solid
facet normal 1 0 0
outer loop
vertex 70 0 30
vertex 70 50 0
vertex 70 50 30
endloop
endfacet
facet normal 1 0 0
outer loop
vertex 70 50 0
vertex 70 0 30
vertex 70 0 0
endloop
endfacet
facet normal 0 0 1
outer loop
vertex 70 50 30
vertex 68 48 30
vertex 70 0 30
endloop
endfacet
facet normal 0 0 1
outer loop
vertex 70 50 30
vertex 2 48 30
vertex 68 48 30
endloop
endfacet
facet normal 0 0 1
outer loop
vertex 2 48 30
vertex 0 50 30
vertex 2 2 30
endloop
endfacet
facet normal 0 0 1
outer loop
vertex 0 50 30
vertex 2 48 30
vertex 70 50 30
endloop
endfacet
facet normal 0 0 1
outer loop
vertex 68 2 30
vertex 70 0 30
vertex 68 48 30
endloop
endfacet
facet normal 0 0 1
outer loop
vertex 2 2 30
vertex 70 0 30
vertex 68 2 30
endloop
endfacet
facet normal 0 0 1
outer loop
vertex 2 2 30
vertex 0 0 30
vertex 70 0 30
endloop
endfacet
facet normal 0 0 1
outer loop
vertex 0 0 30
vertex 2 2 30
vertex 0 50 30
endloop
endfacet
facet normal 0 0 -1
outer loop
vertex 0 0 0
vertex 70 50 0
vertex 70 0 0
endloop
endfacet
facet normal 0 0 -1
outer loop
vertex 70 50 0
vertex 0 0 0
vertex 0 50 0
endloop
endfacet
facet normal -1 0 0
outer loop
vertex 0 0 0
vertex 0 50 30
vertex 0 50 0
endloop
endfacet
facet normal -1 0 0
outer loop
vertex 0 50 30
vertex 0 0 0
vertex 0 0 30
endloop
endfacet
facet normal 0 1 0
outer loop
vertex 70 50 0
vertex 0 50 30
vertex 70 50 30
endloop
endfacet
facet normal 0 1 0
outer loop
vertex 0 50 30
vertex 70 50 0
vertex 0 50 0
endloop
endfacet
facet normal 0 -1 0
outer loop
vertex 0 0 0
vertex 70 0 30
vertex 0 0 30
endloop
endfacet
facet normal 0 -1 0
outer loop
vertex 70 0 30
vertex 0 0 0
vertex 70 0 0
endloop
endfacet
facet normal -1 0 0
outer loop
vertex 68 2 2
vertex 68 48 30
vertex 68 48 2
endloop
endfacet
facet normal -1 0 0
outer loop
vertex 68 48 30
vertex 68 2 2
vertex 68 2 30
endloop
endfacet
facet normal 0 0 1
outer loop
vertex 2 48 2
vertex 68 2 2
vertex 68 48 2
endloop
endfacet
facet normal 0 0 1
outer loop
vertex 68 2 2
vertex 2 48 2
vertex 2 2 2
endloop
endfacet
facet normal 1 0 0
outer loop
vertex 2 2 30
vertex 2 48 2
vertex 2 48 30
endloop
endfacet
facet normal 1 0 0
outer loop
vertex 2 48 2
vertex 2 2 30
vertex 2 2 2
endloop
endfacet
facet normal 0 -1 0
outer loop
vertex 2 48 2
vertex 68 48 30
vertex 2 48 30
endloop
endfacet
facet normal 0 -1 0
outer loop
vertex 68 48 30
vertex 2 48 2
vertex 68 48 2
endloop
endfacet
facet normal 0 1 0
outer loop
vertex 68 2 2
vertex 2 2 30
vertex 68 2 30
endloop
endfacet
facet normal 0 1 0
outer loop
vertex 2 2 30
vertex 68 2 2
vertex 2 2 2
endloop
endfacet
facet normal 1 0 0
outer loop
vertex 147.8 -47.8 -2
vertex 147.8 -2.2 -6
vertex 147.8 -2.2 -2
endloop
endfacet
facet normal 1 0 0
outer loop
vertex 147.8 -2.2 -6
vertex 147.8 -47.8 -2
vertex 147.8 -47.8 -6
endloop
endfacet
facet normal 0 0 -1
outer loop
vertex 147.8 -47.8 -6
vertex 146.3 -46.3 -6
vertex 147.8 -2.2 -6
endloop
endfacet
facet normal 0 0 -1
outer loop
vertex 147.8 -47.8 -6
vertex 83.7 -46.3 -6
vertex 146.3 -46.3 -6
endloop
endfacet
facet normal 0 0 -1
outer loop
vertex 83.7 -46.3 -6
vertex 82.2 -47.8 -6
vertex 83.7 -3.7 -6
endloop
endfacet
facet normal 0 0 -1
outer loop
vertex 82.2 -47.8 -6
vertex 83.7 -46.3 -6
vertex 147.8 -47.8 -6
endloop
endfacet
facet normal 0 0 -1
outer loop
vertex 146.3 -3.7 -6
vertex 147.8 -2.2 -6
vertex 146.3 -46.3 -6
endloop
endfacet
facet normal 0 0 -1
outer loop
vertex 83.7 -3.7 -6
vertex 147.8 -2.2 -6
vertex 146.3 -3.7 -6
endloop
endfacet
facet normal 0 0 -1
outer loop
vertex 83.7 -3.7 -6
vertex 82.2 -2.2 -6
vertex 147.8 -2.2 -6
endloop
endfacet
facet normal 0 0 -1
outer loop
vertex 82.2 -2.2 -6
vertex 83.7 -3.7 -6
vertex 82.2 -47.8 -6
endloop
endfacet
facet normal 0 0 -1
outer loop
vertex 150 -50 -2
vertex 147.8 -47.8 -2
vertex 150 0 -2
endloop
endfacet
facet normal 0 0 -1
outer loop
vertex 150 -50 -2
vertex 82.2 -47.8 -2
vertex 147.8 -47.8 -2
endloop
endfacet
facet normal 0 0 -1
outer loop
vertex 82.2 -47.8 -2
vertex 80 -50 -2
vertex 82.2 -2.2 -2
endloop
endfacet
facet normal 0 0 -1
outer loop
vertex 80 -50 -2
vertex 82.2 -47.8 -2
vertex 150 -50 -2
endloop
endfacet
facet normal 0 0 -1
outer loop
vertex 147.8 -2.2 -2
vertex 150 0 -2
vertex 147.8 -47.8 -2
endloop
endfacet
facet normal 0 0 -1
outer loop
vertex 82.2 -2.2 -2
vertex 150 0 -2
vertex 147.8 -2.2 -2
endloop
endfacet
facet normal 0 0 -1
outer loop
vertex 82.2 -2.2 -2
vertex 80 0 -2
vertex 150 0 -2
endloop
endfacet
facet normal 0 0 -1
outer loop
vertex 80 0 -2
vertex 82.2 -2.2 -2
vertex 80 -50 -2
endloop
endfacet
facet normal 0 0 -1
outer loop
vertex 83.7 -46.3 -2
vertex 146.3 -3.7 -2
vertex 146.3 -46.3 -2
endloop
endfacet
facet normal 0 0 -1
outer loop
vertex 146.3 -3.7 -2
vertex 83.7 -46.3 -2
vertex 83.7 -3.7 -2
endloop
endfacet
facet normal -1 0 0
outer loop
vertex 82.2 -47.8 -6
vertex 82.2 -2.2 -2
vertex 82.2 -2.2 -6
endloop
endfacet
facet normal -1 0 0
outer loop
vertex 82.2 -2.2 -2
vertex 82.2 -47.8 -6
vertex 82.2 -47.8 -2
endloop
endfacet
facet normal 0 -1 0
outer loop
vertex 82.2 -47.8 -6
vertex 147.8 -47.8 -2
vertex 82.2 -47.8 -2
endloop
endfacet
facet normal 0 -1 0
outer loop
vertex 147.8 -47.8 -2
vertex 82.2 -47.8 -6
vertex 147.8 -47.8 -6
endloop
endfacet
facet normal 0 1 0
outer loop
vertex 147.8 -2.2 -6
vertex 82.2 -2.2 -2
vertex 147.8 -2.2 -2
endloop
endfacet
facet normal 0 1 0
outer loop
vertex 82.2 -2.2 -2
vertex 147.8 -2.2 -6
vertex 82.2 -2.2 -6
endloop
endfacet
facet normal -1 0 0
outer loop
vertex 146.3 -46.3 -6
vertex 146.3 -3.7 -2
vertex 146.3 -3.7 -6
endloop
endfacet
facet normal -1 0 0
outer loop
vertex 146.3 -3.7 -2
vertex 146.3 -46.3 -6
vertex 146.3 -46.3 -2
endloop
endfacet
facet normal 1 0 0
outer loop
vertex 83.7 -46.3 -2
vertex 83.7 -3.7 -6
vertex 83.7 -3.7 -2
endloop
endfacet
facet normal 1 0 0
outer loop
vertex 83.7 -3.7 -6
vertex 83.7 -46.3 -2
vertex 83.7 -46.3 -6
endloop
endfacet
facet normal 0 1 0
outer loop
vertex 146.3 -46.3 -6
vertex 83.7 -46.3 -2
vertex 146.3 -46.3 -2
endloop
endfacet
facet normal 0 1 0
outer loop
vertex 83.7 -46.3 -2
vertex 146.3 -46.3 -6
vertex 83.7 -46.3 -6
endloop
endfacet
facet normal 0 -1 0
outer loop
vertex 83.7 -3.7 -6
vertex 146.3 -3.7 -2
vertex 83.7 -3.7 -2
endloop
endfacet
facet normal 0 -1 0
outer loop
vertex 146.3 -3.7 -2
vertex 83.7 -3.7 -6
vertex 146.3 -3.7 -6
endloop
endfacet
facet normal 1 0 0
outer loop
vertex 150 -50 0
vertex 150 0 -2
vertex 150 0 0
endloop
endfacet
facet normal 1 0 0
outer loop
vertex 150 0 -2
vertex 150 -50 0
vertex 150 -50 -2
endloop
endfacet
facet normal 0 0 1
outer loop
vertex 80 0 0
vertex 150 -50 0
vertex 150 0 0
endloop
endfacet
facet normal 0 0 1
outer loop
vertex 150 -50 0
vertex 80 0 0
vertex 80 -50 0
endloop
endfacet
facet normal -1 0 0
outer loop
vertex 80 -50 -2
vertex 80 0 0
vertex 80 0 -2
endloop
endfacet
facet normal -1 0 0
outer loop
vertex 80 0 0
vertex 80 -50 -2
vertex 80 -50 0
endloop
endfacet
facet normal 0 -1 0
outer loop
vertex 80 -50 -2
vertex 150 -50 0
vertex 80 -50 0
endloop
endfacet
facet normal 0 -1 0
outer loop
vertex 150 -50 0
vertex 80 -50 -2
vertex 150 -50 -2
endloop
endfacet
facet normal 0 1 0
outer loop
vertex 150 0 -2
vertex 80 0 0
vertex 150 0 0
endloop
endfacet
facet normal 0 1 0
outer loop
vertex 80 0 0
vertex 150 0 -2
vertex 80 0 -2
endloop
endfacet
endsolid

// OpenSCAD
// Two-part electronics enclosure: Box and Lid
// Designed for FDM printing.

// --- Dimensions ---
box_x = 70.0;         // Outer width of box
box_y = 50.0;         // Outer depth of box
box_z = 30.0;         // Outer height of box
wall_t = 2.0;         // Wall thickness
floor_t = 2.0;        // Floor thickness

lid_plate_t = 2.0;    // Thickness of the lid base plate
lid_lip_h = 4.0;      // Height of the lid lip
lid_lip_t = 1.5;      // Thickness of the lid lip wall

// Clearance calculation:
// Box inner dimensions: (70 - 2*2) x (50 - 2*2) = 66 x 46
// Lid lip outer dimensions: 65.6 x 45.6
// Clearance per side: (66 - 65.6)/2 = 0.2mm (as requested)
lid_lip_x = 65.6;     // Outer width of the lid lip
lid_lip_y = 45.6;     // Outer depth of the lid lip

gap = 10.0;           // Gap between parts on the print bed

$fn = 64;

// --- Part 1: The Box ---
// Sits on XY plane at Z=0
module box() {
    difference() {
        // Main outer body
        cube([box_x, box_y, box_z]);
        
        // Hollow interior
        translate([wall_t, wall_t, floor_t])
            cube([box_x - 2 * wall_t, box_y - 2 * wall_t, box_z]);
    }
}

// --- Part 2: The Lid ---
// Printed upside down (lip facing down)
// To print upside down on the bed, we model it normally and rotate/translate
module lid() {
    union() {
        // The base plate
        cube([box_x, box_y, lid_plate_t]);
        
        // The lip (positioned on the "top" face of the plate)
        // Since we want to print it upside down, we build it 
        // such that the lip is at Z=0 to Z=lid_lip_h
        translate([(box_x - lid_lip_x) / 2, (box_y - lid_lip_y) / 2, lid_plate_t])
            difference() {
                // Outer lip shape
                cube([lid_lip_x, lid_lip_y, lid_lip_h]);
                // Inner lip cutout
                translate([lid_lip_t, lid_lip_t, -0.01])
                    cube([lid_lip_x - 2 * lid_lip_t, lid_lip_y - 2 * lid_lip_t, lid_lip_h + 0.02]);
            }
    }
}

// --- Assembly / Layout ---

// Part 1: The Box
translate([0, 0, 0]) 
    box();

// Part 2: The Lid
// Positioned on the +X side of the box with a 10mm gap.
// The lid is rotated 180 degrees around X to sit on its lip/plate face 
// such that the flat plate is at Z=0.
translate([box_x + gap, 0, 0])
    rotate([180, 0, 0])
    lid();
